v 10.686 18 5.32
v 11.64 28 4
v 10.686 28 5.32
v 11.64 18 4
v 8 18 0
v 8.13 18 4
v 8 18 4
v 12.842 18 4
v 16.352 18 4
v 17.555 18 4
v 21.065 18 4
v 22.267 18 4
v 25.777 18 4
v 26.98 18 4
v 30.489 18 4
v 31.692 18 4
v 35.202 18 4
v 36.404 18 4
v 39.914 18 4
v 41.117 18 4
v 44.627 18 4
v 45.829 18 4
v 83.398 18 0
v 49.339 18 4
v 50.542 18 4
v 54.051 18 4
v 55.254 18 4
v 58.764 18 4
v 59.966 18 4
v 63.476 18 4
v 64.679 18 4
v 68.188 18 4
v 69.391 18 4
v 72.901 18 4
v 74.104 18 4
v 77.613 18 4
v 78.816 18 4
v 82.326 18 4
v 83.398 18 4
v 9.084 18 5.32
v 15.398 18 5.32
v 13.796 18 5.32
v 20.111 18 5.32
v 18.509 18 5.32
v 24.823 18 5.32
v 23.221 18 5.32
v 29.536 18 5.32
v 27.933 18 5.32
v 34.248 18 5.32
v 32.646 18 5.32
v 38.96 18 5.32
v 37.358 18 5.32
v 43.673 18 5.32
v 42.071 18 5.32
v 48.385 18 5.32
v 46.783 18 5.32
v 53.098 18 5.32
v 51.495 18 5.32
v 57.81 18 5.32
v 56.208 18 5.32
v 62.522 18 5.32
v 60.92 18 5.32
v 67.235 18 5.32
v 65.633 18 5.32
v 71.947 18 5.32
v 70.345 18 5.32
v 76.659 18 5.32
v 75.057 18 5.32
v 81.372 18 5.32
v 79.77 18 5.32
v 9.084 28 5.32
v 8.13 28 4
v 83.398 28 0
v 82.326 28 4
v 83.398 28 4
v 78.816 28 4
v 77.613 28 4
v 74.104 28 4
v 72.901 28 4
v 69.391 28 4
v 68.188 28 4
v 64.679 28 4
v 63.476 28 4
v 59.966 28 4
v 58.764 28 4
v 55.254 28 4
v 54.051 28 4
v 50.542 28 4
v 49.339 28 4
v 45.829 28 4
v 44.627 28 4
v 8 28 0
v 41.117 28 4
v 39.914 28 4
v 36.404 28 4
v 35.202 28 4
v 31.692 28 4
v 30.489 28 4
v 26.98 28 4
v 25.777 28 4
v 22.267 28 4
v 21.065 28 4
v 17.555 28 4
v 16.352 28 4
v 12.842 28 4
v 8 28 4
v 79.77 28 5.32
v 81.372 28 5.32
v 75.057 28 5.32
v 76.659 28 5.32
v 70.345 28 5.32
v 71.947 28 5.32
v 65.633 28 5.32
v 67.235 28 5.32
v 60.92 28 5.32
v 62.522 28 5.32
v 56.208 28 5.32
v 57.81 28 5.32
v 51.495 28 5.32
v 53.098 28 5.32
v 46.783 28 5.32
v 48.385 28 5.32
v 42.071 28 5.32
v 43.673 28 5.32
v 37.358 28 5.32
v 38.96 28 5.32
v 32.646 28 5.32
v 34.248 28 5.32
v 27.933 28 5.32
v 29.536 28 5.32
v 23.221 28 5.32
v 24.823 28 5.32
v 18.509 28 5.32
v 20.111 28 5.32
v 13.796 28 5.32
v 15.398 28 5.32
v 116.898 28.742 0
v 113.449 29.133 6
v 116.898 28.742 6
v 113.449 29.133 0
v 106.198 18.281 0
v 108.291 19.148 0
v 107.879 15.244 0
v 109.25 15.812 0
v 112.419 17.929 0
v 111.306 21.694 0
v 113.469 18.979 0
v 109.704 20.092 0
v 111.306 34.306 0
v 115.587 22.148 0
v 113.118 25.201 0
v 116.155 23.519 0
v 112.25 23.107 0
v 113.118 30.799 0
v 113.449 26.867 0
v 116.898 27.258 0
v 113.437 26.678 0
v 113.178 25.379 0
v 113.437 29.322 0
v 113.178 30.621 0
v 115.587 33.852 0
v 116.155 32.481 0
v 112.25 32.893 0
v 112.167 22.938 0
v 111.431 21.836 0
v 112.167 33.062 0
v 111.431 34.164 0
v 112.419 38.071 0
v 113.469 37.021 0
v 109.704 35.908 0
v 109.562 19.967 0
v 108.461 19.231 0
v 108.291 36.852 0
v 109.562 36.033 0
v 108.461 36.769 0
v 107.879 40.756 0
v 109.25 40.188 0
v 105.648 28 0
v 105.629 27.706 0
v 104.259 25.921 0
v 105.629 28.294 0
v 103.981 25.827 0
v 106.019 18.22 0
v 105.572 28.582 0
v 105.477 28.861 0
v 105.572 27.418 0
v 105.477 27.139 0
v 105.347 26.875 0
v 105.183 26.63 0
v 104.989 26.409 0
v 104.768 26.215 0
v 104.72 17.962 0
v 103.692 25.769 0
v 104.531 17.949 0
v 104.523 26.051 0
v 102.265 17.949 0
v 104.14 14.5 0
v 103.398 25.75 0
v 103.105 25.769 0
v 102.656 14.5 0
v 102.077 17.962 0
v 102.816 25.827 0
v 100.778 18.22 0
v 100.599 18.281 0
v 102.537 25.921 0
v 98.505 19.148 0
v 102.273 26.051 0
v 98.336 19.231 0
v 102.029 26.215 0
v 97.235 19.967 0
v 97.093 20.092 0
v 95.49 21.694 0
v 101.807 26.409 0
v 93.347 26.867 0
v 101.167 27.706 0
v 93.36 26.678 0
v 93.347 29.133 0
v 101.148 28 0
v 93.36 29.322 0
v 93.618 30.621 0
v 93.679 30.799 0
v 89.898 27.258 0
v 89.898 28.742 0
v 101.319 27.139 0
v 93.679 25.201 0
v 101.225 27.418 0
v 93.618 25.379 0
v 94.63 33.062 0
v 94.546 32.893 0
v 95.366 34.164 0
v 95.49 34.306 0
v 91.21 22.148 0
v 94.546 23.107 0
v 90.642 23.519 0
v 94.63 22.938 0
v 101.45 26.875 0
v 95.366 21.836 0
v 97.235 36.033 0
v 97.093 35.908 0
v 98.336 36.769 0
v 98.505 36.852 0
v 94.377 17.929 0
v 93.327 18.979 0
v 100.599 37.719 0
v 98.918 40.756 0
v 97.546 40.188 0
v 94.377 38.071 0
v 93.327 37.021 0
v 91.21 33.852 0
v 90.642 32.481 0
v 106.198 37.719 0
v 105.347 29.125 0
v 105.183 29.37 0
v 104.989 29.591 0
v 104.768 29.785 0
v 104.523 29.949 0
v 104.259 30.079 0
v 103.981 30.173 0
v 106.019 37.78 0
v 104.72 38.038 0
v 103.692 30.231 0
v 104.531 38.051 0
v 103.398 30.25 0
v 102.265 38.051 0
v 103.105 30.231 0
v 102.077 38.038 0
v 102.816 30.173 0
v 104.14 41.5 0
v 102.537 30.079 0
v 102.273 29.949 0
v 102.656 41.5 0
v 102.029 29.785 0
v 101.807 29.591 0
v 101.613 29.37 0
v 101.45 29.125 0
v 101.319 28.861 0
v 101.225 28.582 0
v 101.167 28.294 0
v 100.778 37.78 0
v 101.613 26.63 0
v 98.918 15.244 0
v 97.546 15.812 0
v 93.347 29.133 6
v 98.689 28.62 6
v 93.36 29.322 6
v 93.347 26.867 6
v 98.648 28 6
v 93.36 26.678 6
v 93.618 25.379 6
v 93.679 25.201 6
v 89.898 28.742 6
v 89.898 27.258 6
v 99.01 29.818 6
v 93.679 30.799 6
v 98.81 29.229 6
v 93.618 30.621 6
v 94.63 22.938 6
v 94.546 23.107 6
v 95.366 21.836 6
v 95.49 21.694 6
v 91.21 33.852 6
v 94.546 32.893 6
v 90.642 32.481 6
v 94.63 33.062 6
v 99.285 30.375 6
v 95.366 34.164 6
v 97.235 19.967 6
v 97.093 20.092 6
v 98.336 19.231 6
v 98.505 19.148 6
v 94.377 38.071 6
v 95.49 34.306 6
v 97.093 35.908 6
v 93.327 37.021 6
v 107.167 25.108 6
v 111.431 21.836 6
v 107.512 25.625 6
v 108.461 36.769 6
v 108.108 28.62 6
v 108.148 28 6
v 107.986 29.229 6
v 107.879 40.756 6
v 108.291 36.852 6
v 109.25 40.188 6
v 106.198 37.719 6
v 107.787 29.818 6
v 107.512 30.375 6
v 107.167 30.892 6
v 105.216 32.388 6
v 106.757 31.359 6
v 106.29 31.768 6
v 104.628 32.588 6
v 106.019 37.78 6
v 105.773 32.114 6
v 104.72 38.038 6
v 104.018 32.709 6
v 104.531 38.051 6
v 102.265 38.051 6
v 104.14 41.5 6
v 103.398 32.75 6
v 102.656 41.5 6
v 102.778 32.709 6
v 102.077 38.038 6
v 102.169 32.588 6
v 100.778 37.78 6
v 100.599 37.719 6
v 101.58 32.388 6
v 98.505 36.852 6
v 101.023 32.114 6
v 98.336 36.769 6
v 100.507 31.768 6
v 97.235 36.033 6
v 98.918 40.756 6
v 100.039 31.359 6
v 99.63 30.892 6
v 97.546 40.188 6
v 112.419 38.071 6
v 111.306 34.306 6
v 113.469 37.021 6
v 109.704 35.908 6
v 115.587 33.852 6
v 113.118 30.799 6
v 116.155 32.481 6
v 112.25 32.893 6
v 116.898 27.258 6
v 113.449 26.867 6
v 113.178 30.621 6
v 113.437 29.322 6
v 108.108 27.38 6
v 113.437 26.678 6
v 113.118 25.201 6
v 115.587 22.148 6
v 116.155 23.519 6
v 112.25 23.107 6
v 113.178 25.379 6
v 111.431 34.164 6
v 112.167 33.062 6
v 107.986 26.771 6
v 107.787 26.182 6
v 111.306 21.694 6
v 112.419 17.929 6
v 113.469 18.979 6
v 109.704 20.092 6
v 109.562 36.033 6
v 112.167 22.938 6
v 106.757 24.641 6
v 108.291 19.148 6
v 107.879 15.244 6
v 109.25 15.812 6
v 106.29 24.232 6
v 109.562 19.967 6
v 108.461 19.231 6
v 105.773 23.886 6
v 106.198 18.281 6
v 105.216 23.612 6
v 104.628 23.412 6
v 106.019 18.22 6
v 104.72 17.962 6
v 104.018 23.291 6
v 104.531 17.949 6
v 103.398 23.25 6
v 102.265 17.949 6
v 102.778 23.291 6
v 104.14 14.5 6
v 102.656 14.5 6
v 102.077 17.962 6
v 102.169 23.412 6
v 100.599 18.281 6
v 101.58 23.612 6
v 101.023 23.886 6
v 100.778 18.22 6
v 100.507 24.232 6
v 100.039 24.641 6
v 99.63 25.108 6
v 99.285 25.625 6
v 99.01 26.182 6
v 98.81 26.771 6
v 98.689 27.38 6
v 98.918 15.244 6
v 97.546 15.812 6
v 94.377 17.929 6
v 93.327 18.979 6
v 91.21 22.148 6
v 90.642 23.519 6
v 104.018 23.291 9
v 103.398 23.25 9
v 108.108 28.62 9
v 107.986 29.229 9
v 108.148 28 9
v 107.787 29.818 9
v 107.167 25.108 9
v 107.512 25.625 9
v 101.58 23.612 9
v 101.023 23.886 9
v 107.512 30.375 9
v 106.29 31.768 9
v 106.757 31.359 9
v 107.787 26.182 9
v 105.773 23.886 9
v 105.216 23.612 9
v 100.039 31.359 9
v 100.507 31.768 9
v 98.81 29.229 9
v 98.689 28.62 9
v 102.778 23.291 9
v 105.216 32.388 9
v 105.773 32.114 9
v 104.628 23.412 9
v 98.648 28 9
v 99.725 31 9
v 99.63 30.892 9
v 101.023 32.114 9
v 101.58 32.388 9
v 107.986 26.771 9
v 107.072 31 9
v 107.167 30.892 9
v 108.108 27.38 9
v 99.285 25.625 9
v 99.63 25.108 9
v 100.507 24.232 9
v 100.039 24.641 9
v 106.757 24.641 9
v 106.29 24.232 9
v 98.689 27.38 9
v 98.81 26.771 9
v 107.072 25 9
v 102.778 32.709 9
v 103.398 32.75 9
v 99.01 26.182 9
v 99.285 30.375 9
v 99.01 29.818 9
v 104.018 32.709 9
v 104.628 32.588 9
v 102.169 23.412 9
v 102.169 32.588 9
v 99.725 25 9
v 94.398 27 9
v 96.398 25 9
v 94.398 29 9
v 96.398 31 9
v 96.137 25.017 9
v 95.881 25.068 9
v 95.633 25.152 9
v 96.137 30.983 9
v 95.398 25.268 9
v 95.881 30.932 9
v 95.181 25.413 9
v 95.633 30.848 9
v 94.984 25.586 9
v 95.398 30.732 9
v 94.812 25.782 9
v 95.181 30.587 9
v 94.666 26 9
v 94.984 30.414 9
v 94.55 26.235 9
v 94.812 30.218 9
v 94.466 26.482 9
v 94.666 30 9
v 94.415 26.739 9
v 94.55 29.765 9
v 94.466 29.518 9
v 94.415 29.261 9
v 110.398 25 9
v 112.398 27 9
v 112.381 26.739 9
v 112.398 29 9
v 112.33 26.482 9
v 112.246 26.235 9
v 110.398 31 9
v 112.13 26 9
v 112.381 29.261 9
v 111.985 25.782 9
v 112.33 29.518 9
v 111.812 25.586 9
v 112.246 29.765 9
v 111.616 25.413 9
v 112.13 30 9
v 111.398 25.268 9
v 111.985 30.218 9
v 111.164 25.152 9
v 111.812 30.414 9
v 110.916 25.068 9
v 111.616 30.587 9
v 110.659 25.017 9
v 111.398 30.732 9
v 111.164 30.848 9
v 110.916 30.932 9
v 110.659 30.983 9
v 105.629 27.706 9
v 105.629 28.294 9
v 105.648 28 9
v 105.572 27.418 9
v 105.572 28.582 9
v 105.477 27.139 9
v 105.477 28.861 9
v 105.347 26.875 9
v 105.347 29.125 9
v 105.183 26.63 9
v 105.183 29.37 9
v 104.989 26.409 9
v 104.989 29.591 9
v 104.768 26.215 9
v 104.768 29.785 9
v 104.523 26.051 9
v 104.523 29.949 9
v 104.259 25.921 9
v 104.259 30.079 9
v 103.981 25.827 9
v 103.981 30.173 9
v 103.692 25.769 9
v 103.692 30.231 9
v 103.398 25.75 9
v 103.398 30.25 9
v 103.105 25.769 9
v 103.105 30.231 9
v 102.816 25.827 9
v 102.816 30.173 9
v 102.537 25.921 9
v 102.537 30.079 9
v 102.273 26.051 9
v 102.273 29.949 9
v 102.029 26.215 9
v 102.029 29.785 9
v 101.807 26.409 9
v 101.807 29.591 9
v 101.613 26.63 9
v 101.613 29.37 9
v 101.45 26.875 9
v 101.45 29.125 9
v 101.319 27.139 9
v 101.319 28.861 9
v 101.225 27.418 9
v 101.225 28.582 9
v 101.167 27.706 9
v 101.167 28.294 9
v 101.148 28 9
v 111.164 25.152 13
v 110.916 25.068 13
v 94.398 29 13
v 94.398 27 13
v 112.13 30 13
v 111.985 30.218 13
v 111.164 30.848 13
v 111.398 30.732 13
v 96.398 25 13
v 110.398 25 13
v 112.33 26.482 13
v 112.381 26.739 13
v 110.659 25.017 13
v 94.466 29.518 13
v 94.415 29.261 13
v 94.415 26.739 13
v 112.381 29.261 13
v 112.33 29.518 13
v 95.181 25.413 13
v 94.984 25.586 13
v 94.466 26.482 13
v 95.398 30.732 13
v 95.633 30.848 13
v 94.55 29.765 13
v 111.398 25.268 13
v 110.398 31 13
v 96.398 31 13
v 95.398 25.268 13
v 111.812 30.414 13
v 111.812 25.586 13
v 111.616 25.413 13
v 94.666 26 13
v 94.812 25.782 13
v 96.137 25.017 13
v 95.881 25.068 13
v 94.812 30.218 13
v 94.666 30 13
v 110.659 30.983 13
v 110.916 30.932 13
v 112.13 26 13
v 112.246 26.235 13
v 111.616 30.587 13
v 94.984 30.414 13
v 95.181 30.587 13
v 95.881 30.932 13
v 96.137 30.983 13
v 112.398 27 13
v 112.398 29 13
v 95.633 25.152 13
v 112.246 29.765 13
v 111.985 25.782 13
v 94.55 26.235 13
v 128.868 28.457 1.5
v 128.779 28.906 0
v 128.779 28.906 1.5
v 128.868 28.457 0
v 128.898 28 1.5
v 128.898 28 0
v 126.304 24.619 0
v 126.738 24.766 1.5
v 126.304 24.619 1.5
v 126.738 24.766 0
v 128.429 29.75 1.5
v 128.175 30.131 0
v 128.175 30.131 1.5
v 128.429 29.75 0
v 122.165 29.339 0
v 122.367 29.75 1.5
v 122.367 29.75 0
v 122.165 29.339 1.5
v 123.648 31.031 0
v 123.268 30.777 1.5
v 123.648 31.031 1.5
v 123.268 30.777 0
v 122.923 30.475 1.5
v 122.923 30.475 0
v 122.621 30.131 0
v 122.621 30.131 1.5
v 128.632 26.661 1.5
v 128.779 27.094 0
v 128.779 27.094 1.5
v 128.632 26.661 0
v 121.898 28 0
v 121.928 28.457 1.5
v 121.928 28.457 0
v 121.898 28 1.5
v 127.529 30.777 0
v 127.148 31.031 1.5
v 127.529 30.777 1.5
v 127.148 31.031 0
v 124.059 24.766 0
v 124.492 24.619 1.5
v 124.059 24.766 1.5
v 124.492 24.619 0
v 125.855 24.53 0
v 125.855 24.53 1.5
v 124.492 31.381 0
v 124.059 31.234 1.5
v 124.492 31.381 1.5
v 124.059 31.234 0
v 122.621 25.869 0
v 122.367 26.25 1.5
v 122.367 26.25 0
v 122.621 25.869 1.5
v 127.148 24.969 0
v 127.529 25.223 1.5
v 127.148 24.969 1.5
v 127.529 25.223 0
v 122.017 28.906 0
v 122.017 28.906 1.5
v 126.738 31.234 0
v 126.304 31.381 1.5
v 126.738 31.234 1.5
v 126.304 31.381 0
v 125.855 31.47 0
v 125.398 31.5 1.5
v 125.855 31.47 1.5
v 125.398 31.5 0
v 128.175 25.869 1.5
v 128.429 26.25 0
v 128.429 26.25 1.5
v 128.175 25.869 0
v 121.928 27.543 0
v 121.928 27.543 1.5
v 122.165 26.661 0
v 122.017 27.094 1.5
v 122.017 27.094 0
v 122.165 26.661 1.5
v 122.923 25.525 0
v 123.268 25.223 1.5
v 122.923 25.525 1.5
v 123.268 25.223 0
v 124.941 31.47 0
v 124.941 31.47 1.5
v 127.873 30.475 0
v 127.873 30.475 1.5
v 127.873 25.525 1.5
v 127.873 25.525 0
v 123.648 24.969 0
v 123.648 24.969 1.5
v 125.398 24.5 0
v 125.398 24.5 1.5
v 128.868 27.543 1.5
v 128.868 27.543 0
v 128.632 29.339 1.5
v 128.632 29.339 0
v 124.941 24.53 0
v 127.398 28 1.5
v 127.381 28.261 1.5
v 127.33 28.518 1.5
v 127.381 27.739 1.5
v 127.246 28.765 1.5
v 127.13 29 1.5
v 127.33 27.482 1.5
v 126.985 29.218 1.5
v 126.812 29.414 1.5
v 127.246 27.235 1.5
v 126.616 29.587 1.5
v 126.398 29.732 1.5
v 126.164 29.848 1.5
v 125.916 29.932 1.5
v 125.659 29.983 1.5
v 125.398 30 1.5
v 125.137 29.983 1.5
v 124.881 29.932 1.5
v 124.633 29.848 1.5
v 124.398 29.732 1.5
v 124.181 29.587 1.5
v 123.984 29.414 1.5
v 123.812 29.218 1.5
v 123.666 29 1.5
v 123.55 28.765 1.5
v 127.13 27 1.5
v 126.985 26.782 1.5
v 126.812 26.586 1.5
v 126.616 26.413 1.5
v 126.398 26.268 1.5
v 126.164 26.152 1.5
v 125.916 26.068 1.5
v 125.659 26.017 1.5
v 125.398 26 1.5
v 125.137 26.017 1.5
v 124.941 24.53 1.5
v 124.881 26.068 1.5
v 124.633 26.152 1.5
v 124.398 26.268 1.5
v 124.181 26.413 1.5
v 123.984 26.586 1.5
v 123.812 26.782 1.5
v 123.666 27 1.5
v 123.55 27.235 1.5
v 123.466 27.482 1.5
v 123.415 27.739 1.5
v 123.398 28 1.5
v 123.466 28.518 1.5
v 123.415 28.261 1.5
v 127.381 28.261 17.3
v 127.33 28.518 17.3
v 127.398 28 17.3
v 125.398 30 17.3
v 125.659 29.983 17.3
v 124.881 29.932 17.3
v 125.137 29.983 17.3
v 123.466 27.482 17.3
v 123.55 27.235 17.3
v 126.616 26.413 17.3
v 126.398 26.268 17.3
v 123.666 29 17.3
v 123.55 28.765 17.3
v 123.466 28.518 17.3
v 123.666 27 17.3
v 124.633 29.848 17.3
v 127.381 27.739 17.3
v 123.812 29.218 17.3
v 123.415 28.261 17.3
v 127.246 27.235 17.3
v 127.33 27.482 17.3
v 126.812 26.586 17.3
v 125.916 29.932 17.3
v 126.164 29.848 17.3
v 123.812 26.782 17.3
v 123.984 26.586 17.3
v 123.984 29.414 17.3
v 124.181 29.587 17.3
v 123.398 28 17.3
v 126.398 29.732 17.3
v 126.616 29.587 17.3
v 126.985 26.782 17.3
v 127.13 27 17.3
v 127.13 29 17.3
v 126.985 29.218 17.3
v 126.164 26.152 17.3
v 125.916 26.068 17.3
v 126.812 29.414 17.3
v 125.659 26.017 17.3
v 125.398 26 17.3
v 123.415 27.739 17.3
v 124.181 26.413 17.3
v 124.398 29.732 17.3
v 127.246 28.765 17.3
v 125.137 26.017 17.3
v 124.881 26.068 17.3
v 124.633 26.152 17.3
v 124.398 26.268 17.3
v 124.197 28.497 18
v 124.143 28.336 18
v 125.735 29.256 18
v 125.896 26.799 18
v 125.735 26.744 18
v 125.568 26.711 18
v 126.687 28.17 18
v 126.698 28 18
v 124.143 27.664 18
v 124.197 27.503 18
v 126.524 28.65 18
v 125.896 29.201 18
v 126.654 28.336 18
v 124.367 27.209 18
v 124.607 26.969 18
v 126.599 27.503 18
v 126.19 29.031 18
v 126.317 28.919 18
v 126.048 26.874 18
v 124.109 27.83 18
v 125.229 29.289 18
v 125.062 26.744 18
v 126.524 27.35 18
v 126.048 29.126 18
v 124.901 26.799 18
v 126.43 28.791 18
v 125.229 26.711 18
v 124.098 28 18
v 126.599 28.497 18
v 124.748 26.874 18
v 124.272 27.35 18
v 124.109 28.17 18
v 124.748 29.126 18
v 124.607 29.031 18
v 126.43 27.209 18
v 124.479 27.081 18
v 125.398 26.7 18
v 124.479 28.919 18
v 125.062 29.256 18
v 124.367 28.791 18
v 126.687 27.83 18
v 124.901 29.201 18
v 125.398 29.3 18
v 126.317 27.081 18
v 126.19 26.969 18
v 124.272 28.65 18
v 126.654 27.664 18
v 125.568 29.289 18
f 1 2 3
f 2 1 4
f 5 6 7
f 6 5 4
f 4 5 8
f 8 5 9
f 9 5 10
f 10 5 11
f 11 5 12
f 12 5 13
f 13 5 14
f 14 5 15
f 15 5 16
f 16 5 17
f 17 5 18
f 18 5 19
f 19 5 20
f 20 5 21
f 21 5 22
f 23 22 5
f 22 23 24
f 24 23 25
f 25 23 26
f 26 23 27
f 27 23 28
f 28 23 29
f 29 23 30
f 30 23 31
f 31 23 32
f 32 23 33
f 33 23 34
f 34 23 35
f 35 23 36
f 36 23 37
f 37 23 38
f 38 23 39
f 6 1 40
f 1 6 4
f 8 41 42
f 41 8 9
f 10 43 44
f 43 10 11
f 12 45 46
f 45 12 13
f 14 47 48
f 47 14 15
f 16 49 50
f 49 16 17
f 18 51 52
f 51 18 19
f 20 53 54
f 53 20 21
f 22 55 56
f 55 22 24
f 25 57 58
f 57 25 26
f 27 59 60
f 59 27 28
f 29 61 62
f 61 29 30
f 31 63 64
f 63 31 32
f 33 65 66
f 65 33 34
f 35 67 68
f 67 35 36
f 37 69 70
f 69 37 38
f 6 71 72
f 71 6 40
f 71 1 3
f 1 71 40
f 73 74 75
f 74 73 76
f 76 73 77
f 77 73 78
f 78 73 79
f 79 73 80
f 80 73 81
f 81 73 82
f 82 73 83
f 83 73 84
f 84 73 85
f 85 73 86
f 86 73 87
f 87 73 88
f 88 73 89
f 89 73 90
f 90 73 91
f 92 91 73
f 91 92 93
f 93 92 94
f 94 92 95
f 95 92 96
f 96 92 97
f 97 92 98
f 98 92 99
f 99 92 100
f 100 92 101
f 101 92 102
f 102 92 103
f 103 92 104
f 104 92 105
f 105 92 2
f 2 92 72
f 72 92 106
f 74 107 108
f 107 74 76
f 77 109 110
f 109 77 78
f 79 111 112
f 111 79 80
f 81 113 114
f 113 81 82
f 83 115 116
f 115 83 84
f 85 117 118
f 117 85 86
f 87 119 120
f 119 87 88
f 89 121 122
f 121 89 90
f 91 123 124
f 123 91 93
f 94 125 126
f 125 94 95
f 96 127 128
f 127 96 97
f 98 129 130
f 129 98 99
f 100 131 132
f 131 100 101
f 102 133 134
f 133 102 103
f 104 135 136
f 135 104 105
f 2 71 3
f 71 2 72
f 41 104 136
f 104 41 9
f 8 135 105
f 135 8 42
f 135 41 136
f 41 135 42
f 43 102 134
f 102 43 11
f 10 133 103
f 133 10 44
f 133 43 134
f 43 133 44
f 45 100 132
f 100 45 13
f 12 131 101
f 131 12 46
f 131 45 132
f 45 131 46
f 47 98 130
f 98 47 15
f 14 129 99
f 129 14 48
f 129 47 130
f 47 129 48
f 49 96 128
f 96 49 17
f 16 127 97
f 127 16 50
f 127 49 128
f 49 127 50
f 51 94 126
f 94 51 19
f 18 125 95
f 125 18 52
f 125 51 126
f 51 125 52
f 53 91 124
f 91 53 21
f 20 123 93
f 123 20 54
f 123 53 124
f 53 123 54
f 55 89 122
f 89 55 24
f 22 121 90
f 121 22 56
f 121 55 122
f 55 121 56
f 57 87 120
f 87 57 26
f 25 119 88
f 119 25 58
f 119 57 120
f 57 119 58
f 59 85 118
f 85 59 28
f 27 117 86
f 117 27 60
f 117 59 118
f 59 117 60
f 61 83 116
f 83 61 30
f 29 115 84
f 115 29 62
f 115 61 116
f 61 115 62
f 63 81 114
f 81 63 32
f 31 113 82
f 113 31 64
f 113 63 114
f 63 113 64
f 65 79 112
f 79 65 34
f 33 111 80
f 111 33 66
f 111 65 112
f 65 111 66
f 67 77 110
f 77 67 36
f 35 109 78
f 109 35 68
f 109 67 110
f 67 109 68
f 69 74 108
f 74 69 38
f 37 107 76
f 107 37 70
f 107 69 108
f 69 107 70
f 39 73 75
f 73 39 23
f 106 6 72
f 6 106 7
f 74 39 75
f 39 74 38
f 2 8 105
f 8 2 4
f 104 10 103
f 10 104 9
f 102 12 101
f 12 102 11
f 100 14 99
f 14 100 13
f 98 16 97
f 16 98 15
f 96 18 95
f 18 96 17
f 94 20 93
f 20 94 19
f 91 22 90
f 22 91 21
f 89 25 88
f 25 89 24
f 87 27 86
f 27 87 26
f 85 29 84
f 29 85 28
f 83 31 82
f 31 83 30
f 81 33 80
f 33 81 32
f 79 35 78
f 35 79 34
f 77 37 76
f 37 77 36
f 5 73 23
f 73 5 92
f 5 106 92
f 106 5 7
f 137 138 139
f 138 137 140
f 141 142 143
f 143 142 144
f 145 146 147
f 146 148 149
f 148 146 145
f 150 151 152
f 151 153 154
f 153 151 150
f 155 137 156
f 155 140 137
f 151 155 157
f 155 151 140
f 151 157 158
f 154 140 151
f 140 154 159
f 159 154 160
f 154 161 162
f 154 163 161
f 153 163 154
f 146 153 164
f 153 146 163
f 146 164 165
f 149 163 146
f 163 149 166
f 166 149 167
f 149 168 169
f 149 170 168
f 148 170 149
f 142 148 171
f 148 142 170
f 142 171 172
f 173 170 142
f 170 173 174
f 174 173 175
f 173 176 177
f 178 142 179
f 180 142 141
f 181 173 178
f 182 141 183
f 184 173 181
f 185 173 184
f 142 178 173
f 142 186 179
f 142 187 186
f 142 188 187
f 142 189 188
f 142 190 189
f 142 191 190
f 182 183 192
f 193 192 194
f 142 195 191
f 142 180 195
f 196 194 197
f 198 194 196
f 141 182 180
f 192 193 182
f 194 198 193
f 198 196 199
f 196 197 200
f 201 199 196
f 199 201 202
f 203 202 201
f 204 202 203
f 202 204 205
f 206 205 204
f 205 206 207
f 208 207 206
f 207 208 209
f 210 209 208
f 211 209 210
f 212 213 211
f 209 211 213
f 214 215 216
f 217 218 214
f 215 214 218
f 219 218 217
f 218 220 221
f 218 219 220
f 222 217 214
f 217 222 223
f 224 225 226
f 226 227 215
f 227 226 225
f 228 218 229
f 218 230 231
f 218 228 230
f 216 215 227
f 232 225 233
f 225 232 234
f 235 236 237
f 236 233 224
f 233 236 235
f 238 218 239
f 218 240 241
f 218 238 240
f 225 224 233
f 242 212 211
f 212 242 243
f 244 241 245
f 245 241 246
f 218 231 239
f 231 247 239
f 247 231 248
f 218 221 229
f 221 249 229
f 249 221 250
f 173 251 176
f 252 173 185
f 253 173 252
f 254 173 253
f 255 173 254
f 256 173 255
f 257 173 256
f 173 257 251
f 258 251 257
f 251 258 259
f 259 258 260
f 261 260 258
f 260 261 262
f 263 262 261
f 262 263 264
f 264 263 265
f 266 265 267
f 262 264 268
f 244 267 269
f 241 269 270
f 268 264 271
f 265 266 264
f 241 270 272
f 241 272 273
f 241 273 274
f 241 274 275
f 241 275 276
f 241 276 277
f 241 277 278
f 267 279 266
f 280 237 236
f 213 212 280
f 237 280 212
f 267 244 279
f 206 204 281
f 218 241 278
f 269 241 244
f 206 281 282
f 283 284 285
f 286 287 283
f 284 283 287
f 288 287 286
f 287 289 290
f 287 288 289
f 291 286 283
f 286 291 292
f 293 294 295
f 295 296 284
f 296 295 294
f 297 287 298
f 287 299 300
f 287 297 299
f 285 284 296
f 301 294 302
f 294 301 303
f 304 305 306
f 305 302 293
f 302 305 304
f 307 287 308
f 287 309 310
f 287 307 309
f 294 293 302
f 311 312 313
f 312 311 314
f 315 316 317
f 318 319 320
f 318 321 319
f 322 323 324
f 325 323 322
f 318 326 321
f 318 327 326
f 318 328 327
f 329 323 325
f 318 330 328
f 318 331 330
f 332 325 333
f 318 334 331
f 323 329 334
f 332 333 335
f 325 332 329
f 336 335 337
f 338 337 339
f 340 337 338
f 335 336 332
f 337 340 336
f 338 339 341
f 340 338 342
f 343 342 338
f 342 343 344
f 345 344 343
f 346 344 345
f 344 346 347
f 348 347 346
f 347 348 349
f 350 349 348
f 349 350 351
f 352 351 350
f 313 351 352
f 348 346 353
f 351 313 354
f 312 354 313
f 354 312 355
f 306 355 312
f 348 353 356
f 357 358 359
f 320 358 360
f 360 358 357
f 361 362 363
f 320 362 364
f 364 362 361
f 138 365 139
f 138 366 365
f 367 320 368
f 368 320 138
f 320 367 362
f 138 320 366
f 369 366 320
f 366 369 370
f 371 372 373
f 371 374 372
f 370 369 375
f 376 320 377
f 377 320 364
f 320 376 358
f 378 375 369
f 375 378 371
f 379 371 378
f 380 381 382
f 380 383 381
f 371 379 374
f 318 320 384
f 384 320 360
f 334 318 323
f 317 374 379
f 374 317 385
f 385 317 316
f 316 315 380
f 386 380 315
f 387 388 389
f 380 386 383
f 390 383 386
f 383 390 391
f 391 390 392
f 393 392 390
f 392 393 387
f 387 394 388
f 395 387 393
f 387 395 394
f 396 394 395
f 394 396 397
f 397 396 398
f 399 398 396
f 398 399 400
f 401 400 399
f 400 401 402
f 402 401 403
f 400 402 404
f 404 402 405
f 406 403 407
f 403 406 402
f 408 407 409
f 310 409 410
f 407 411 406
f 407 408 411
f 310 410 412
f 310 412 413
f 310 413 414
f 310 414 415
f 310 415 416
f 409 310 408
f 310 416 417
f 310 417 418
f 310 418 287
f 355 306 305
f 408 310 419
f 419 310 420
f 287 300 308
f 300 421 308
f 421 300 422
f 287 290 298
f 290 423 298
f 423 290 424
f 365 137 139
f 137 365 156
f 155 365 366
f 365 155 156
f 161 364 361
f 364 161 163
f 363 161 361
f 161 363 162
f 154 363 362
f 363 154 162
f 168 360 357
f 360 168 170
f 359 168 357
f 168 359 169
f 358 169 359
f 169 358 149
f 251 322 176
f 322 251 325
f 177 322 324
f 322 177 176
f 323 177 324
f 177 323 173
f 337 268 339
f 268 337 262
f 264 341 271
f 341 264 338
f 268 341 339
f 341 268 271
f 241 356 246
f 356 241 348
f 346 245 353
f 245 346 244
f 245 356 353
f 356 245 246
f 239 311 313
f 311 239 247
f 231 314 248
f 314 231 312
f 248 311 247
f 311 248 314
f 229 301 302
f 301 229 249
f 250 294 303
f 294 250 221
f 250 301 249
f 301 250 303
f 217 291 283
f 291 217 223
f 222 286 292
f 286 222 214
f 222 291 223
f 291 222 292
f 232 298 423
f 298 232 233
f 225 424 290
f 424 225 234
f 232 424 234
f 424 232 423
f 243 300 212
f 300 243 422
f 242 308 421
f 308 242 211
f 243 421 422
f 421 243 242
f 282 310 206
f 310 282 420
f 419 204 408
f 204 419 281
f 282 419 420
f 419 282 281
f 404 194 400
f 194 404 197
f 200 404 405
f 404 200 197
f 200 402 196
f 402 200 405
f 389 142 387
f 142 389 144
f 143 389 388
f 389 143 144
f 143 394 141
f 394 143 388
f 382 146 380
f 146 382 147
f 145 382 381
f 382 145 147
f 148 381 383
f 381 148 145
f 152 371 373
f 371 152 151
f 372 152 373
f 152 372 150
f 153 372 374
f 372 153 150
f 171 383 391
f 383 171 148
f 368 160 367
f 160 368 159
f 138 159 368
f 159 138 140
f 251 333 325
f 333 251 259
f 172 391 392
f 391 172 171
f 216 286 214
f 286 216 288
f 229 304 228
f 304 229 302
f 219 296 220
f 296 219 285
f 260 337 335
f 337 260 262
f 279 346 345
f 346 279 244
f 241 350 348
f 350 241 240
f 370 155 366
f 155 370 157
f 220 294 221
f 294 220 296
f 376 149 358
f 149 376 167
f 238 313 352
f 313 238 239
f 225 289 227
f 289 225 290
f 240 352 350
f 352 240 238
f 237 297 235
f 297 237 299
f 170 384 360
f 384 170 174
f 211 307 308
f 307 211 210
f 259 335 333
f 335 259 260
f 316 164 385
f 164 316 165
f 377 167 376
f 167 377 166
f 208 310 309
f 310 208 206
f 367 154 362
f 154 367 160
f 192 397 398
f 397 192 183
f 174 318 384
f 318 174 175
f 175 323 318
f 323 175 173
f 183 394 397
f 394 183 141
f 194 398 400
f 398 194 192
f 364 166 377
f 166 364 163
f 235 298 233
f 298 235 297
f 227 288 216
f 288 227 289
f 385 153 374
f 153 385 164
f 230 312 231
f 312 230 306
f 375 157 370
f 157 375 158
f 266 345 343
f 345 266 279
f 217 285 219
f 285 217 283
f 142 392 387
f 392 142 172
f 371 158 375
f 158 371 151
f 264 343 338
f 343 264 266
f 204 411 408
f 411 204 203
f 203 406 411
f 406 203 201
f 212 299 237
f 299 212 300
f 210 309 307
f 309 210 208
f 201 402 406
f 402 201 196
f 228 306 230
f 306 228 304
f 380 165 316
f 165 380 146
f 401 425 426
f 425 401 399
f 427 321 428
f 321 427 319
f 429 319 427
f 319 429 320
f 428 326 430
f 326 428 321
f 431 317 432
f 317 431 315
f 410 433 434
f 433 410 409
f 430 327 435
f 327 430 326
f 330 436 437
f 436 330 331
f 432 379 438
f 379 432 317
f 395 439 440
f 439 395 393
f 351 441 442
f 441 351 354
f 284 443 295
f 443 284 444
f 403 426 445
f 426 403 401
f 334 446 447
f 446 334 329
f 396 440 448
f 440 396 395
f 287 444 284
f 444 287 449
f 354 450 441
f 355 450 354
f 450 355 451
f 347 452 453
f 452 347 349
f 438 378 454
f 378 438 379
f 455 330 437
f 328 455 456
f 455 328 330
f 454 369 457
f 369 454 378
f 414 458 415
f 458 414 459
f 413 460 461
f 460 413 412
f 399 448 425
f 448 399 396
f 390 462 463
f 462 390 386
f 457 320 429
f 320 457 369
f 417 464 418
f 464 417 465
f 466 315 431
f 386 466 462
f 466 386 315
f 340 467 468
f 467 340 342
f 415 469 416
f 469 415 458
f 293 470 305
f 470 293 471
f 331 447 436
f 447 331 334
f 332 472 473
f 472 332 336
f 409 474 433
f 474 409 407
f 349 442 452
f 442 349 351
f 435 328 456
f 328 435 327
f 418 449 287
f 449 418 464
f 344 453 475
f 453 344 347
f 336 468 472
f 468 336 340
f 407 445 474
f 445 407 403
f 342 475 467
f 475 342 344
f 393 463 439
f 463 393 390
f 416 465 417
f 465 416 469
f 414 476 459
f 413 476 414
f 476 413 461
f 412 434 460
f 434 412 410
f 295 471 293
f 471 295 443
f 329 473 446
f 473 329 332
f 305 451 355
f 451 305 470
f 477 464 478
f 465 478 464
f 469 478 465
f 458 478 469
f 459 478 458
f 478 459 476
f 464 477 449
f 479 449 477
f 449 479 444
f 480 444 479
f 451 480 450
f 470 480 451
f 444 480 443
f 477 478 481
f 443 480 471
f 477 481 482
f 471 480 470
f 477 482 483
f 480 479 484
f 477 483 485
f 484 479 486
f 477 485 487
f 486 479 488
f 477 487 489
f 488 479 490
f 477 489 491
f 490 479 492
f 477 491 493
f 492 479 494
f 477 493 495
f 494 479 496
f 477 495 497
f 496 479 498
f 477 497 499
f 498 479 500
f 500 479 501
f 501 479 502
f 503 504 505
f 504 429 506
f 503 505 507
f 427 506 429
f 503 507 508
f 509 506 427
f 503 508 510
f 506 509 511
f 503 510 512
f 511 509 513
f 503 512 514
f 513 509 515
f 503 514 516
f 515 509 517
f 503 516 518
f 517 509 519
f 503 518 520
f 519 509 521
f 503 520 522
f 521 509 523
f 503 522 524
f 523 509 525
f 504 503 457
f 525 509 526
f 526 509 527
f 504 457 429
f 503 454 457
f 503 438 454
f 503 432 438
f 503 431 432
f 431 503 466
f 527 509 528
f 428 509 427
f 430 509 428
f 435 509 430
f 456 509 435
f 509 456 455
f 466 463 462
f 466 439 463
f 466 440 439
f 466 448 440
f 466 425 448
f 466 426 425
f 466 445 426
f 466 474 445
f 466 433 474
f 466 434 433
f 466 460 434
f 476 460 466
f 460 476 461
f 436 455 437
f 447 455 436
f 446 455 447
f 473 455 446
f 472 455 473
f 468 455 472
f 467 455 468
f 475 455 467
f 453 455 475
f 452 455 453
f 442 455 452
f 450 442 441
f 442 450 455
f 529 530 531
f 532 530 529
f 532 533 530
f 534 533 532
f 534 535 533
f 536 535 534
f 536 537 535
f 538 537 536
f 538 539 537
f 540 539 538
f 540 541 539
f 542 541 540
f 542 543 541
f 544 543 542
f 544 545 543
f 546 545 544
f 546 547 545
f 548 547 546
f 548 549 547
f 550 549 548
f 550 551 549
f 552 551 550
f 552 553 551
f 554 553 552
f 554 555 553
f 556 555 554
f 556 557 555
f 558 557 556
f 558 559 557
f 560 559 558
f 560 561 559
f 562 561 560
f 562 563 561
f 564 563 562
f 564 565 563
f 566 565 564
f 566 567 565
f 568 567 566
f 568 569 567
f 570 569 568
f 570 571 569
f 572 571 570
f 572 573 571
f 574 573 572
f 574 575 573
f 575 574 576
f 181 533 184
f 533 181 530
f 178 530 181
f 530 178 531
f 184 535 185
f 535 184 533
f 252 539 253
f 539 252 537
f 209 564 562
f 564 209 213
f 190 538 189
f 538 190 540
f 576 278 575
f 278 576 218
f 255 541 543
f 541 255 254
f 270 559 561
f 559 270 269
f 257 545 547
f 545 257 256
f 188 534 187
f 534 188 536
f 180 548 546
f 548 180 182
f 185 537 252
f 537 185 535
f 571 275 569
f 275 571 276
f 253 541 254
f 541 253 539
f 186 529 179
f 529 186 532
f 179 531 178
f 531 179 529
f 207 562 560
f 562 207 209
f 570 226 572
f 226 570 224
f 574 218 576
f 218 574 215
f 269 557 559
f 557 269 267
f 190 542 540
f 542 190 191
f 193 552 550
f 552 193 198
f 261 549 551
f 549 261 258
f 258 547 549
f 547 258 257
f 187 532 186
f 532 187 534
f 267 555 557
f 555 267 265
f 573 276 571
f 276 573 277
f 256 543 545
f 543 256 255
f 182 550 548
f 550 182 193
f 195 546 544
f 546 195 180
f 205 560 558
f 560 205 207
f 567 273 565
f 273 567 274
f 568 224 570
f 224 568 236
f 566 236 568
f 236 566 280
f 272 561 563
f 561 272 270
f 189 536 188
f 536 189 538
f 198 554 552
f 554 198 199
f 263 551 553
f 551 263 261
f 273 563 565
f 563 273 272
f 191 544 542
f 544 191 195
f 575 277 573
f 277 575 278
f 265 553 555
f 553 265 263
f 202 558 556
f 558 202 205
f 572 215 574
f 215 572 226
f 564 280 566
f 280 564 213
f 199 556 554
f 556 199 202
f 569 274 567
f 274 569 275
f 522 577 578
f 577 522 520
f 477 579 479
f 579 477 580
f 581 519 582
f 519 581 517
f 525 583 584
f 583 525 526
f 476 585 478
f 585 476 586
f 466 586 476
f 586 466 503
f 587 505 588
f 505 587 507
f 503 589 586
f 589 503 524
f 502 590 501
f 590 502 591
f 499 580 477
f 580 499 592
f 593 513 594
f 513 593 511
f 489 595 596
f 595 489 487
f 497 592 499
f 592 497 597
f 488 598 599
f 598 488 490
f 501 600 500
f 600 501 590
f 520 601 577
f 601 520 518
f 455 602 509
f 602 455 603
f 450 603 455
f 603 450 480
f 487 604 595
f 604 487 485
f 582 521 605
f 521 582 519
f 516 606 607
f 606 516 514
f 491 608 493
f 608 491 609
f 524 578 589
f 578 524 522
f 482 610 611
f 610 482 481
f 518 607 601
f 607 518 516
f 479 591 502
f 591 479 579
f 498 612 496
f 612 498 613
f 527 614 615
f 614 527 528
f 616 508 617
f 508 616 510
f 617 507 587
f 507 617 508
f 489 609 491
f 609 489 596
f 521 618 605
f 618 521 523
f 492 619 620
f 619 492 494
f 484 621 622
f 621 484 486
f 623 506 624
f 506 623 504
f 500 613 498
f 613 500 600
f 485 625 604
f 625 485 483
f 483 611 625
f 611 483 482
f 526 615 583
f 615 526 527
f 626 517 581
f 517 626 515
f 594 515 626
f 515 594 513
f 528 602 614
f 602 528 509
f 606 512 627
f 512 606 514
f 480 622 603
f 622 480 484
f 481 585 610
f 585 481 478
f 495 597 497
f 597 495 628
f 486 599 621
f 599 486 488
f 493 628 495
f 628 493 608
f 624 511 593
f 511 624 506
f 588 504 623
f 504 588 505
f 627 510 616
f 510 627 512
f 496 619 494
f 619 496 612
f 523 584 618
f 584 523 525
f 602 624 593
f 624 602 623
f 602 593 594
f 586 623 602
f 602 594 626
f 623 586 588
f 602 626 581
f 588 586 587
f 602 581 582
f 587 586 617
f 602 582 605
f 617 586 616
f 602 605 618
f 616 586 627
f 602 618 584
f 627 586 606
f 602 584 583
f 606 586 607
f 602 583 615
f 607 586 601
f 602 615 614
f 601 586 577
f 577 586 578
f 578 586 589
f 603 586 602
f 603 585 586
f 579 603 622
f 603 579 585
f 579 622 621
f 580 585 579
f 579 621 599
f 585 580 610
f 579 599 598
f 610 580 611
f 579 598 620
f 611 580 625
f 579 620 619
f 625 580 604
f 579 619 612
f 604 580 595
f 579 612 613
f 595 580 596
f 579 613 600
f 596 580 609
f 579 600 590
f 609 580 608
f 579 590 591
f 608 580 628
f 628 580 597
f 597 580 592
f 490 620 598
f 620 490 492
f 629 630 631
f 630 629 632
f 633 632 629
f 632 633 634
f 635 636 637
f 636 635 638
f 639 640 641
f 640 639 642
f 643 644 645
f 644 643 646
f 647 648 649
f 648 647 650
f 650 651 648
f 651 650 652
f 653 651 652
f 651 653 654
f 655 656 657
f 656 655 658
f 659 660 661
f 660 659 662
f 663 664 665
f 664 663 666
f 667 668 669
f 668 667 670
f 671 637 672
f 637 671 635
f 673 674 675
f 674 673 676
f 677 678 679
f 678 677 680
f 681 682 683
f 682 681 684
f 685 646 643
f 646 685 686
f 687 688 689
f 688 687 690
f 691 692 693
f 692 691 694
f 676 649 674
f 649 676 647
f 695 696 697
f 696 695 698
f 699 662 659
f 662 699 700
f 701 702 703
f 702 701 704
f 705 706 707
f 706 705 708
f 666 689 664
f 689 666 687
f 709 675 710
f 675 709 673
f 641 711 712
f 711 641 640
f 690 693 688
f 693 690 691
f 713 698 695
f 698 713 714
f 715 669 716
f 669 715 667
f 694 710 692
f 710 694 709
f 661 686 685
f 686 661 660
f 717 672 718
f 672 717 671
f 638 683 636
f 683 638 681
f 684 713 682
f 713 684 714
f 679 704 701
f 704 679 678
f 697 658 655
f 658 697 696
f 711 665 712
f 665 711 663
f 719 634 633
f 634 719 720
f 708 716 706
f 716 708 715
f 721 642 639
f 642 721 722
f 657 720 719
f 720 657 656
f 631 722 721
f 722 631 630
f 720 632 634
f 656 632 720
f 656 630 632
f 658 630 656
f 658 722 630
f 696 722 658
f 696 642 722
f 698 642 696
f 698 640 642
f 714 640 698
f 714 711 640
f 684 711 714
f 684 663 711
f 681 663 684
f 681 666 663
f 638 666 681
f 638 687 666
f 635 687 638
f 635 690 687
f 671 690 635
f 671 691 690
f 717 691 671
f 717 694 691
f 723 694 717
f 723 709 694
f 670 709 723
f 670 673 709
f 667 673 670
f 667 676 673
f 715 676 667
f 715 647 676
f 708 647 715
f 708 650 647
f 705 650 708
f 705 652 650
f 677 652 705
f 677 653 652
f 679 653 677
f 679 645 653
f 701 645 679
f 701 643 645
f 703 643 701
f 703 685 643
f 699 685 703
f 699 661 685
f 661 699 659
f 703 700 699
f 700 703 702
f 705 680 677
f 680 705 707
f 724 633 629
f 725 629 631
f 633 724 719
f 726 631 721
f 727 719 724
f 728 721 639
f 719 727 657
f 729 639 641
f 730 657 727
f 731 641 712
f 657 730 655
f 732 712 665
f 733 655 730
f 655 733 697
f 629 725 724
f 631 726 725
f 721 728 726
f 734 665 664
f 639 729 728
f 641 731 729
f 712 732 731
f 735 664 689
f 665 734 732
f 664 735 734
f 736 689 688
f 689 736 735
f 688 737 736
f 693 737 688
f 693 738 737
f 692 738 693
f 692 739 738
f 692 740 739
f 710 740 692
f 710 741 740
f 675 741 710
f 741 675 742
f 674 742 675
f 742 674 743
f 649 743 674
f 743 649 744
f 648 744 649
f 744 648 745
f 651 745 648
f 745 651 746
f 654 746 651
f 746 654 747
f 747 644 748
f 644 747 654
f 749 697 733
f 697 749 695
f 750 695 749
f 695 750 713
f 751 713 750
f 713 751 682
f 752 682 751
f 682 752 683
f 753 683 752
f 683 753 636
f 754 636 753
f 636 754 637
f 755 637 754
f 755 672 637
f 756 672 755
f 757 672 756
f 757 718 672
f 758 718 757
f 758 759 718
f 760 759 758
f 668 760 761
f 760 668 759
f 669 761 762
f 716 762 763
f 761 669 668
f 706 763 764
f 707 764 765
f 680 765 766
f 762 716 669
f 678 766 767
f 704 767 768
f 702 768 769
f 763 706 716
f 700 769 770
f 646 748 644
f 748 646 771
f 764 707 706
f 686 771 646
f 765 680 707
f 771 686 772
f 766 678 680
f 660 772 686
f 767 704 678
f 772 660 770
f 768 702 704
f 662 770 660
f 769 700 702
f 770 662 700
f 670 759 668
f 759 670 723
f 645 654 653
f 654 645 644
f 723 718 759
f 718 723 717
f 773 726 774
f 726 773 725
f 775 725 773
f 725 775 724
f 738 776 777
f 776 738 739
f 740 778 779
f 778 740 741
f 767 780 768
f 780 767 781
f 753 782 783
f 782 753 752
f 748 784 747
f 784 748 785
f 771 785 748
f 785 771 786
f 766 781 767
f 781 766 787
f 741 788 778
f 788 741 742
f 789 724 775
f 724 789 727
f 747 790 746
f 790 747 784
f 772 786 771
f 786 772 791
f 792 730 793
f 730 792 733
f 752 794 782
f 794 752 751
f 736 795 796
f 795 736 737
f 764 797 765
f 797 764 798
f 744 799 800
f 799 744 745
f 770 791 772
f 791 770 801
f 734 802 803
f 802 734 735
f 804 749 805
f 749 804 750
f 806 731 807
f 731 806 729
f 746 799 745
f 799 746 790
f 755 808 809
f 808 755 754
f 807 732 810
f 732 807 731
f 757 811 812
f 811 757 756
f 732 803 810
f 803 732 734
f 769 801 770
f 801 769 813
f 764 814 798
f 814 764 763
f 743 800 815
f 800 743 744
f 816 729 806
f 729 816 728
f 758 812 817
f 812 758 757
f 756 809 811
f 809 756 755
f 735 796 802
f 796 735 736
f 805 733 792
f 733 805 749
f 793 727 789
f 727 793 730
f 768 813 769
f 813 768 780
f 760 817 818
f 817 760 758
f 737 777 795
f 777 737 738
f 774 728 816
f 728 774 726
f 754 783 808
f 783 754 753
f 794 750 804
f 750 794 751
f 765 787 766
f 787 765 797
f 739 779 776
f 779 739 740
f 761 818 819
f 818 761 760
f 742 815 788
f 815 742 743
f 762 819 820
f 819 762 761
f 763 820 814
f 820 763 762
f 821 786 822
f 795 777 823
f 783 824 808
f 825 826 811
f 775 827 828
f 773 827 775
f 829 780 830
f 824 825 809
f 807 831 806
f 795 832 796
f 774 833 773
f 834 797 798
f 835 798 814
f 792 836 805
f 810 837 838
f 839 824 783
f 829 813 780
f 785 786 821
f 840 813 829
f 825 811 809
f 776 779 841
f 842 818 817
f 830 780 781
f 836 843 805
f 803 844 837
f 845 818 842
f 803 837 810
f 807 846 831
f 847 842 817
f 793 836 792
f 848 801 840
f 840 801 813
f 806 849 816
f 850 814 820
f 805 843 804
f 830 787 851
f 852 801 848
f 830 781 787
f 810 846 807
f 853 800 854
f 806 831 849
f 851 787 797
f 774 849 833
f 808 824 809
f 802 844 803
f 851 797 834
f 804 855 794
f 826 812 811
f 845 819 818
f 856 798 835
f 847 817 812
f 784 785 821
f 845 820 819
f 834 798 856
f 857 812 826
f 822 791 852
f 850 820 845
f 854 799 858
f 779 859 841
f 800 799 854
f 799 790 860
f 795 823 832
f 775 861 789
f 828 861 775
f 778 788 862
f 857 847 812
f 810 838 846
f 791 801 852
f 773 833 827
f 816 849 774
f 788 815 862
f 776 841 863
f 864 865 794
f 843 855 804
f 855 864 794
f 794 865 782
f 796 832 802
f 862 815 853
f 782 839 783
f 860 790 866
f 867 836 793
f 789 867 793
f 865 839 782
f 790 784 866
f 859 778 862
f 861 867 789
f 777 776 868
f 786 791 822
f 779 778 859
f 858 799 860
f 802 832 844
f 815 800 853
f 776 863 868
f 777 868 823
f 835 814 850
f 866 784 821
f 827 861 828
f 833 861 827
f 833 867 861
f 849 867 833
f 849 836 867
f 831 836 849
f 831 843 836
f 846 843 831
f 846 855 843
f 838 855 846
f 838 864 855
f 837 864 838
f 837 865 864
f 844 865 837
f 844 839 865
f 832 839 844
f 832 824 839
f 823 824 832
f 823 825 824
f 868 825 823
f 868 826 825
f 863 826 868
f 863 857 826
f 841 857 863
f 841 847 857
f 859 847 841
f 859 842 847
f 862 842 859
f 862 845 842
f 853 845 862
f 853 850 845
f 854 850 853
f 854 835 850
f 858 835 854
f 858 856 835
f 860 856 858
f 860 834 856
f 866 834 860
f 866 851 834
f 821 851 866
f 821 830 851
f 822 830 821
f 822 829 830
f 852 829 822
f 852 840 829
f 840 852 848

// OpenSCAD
/*
Sample 098: Zahnstange und Ritzel — Modul 1,50
Generated from the FDM Mechanical Sample Library.
Units: millimetres.

Override examples:
  openscad -o custom.stl -D 'view="plate"' -D 'render_fn=64' model.scad
  openscad -o preview.png -D 'view="assembly"' model.scad
*/
use <../../../library/fdm_mechanisms.scad>

render_fn = is_undef(render_fn) ? 48 : render_fn;
view = is_undef(view) ? "plate" : view;
$fn = render_fn;

sample_rack_pinion(
    view=view,
    teeth=16,
    module_size=1.5,
    clearance=0.25
);
